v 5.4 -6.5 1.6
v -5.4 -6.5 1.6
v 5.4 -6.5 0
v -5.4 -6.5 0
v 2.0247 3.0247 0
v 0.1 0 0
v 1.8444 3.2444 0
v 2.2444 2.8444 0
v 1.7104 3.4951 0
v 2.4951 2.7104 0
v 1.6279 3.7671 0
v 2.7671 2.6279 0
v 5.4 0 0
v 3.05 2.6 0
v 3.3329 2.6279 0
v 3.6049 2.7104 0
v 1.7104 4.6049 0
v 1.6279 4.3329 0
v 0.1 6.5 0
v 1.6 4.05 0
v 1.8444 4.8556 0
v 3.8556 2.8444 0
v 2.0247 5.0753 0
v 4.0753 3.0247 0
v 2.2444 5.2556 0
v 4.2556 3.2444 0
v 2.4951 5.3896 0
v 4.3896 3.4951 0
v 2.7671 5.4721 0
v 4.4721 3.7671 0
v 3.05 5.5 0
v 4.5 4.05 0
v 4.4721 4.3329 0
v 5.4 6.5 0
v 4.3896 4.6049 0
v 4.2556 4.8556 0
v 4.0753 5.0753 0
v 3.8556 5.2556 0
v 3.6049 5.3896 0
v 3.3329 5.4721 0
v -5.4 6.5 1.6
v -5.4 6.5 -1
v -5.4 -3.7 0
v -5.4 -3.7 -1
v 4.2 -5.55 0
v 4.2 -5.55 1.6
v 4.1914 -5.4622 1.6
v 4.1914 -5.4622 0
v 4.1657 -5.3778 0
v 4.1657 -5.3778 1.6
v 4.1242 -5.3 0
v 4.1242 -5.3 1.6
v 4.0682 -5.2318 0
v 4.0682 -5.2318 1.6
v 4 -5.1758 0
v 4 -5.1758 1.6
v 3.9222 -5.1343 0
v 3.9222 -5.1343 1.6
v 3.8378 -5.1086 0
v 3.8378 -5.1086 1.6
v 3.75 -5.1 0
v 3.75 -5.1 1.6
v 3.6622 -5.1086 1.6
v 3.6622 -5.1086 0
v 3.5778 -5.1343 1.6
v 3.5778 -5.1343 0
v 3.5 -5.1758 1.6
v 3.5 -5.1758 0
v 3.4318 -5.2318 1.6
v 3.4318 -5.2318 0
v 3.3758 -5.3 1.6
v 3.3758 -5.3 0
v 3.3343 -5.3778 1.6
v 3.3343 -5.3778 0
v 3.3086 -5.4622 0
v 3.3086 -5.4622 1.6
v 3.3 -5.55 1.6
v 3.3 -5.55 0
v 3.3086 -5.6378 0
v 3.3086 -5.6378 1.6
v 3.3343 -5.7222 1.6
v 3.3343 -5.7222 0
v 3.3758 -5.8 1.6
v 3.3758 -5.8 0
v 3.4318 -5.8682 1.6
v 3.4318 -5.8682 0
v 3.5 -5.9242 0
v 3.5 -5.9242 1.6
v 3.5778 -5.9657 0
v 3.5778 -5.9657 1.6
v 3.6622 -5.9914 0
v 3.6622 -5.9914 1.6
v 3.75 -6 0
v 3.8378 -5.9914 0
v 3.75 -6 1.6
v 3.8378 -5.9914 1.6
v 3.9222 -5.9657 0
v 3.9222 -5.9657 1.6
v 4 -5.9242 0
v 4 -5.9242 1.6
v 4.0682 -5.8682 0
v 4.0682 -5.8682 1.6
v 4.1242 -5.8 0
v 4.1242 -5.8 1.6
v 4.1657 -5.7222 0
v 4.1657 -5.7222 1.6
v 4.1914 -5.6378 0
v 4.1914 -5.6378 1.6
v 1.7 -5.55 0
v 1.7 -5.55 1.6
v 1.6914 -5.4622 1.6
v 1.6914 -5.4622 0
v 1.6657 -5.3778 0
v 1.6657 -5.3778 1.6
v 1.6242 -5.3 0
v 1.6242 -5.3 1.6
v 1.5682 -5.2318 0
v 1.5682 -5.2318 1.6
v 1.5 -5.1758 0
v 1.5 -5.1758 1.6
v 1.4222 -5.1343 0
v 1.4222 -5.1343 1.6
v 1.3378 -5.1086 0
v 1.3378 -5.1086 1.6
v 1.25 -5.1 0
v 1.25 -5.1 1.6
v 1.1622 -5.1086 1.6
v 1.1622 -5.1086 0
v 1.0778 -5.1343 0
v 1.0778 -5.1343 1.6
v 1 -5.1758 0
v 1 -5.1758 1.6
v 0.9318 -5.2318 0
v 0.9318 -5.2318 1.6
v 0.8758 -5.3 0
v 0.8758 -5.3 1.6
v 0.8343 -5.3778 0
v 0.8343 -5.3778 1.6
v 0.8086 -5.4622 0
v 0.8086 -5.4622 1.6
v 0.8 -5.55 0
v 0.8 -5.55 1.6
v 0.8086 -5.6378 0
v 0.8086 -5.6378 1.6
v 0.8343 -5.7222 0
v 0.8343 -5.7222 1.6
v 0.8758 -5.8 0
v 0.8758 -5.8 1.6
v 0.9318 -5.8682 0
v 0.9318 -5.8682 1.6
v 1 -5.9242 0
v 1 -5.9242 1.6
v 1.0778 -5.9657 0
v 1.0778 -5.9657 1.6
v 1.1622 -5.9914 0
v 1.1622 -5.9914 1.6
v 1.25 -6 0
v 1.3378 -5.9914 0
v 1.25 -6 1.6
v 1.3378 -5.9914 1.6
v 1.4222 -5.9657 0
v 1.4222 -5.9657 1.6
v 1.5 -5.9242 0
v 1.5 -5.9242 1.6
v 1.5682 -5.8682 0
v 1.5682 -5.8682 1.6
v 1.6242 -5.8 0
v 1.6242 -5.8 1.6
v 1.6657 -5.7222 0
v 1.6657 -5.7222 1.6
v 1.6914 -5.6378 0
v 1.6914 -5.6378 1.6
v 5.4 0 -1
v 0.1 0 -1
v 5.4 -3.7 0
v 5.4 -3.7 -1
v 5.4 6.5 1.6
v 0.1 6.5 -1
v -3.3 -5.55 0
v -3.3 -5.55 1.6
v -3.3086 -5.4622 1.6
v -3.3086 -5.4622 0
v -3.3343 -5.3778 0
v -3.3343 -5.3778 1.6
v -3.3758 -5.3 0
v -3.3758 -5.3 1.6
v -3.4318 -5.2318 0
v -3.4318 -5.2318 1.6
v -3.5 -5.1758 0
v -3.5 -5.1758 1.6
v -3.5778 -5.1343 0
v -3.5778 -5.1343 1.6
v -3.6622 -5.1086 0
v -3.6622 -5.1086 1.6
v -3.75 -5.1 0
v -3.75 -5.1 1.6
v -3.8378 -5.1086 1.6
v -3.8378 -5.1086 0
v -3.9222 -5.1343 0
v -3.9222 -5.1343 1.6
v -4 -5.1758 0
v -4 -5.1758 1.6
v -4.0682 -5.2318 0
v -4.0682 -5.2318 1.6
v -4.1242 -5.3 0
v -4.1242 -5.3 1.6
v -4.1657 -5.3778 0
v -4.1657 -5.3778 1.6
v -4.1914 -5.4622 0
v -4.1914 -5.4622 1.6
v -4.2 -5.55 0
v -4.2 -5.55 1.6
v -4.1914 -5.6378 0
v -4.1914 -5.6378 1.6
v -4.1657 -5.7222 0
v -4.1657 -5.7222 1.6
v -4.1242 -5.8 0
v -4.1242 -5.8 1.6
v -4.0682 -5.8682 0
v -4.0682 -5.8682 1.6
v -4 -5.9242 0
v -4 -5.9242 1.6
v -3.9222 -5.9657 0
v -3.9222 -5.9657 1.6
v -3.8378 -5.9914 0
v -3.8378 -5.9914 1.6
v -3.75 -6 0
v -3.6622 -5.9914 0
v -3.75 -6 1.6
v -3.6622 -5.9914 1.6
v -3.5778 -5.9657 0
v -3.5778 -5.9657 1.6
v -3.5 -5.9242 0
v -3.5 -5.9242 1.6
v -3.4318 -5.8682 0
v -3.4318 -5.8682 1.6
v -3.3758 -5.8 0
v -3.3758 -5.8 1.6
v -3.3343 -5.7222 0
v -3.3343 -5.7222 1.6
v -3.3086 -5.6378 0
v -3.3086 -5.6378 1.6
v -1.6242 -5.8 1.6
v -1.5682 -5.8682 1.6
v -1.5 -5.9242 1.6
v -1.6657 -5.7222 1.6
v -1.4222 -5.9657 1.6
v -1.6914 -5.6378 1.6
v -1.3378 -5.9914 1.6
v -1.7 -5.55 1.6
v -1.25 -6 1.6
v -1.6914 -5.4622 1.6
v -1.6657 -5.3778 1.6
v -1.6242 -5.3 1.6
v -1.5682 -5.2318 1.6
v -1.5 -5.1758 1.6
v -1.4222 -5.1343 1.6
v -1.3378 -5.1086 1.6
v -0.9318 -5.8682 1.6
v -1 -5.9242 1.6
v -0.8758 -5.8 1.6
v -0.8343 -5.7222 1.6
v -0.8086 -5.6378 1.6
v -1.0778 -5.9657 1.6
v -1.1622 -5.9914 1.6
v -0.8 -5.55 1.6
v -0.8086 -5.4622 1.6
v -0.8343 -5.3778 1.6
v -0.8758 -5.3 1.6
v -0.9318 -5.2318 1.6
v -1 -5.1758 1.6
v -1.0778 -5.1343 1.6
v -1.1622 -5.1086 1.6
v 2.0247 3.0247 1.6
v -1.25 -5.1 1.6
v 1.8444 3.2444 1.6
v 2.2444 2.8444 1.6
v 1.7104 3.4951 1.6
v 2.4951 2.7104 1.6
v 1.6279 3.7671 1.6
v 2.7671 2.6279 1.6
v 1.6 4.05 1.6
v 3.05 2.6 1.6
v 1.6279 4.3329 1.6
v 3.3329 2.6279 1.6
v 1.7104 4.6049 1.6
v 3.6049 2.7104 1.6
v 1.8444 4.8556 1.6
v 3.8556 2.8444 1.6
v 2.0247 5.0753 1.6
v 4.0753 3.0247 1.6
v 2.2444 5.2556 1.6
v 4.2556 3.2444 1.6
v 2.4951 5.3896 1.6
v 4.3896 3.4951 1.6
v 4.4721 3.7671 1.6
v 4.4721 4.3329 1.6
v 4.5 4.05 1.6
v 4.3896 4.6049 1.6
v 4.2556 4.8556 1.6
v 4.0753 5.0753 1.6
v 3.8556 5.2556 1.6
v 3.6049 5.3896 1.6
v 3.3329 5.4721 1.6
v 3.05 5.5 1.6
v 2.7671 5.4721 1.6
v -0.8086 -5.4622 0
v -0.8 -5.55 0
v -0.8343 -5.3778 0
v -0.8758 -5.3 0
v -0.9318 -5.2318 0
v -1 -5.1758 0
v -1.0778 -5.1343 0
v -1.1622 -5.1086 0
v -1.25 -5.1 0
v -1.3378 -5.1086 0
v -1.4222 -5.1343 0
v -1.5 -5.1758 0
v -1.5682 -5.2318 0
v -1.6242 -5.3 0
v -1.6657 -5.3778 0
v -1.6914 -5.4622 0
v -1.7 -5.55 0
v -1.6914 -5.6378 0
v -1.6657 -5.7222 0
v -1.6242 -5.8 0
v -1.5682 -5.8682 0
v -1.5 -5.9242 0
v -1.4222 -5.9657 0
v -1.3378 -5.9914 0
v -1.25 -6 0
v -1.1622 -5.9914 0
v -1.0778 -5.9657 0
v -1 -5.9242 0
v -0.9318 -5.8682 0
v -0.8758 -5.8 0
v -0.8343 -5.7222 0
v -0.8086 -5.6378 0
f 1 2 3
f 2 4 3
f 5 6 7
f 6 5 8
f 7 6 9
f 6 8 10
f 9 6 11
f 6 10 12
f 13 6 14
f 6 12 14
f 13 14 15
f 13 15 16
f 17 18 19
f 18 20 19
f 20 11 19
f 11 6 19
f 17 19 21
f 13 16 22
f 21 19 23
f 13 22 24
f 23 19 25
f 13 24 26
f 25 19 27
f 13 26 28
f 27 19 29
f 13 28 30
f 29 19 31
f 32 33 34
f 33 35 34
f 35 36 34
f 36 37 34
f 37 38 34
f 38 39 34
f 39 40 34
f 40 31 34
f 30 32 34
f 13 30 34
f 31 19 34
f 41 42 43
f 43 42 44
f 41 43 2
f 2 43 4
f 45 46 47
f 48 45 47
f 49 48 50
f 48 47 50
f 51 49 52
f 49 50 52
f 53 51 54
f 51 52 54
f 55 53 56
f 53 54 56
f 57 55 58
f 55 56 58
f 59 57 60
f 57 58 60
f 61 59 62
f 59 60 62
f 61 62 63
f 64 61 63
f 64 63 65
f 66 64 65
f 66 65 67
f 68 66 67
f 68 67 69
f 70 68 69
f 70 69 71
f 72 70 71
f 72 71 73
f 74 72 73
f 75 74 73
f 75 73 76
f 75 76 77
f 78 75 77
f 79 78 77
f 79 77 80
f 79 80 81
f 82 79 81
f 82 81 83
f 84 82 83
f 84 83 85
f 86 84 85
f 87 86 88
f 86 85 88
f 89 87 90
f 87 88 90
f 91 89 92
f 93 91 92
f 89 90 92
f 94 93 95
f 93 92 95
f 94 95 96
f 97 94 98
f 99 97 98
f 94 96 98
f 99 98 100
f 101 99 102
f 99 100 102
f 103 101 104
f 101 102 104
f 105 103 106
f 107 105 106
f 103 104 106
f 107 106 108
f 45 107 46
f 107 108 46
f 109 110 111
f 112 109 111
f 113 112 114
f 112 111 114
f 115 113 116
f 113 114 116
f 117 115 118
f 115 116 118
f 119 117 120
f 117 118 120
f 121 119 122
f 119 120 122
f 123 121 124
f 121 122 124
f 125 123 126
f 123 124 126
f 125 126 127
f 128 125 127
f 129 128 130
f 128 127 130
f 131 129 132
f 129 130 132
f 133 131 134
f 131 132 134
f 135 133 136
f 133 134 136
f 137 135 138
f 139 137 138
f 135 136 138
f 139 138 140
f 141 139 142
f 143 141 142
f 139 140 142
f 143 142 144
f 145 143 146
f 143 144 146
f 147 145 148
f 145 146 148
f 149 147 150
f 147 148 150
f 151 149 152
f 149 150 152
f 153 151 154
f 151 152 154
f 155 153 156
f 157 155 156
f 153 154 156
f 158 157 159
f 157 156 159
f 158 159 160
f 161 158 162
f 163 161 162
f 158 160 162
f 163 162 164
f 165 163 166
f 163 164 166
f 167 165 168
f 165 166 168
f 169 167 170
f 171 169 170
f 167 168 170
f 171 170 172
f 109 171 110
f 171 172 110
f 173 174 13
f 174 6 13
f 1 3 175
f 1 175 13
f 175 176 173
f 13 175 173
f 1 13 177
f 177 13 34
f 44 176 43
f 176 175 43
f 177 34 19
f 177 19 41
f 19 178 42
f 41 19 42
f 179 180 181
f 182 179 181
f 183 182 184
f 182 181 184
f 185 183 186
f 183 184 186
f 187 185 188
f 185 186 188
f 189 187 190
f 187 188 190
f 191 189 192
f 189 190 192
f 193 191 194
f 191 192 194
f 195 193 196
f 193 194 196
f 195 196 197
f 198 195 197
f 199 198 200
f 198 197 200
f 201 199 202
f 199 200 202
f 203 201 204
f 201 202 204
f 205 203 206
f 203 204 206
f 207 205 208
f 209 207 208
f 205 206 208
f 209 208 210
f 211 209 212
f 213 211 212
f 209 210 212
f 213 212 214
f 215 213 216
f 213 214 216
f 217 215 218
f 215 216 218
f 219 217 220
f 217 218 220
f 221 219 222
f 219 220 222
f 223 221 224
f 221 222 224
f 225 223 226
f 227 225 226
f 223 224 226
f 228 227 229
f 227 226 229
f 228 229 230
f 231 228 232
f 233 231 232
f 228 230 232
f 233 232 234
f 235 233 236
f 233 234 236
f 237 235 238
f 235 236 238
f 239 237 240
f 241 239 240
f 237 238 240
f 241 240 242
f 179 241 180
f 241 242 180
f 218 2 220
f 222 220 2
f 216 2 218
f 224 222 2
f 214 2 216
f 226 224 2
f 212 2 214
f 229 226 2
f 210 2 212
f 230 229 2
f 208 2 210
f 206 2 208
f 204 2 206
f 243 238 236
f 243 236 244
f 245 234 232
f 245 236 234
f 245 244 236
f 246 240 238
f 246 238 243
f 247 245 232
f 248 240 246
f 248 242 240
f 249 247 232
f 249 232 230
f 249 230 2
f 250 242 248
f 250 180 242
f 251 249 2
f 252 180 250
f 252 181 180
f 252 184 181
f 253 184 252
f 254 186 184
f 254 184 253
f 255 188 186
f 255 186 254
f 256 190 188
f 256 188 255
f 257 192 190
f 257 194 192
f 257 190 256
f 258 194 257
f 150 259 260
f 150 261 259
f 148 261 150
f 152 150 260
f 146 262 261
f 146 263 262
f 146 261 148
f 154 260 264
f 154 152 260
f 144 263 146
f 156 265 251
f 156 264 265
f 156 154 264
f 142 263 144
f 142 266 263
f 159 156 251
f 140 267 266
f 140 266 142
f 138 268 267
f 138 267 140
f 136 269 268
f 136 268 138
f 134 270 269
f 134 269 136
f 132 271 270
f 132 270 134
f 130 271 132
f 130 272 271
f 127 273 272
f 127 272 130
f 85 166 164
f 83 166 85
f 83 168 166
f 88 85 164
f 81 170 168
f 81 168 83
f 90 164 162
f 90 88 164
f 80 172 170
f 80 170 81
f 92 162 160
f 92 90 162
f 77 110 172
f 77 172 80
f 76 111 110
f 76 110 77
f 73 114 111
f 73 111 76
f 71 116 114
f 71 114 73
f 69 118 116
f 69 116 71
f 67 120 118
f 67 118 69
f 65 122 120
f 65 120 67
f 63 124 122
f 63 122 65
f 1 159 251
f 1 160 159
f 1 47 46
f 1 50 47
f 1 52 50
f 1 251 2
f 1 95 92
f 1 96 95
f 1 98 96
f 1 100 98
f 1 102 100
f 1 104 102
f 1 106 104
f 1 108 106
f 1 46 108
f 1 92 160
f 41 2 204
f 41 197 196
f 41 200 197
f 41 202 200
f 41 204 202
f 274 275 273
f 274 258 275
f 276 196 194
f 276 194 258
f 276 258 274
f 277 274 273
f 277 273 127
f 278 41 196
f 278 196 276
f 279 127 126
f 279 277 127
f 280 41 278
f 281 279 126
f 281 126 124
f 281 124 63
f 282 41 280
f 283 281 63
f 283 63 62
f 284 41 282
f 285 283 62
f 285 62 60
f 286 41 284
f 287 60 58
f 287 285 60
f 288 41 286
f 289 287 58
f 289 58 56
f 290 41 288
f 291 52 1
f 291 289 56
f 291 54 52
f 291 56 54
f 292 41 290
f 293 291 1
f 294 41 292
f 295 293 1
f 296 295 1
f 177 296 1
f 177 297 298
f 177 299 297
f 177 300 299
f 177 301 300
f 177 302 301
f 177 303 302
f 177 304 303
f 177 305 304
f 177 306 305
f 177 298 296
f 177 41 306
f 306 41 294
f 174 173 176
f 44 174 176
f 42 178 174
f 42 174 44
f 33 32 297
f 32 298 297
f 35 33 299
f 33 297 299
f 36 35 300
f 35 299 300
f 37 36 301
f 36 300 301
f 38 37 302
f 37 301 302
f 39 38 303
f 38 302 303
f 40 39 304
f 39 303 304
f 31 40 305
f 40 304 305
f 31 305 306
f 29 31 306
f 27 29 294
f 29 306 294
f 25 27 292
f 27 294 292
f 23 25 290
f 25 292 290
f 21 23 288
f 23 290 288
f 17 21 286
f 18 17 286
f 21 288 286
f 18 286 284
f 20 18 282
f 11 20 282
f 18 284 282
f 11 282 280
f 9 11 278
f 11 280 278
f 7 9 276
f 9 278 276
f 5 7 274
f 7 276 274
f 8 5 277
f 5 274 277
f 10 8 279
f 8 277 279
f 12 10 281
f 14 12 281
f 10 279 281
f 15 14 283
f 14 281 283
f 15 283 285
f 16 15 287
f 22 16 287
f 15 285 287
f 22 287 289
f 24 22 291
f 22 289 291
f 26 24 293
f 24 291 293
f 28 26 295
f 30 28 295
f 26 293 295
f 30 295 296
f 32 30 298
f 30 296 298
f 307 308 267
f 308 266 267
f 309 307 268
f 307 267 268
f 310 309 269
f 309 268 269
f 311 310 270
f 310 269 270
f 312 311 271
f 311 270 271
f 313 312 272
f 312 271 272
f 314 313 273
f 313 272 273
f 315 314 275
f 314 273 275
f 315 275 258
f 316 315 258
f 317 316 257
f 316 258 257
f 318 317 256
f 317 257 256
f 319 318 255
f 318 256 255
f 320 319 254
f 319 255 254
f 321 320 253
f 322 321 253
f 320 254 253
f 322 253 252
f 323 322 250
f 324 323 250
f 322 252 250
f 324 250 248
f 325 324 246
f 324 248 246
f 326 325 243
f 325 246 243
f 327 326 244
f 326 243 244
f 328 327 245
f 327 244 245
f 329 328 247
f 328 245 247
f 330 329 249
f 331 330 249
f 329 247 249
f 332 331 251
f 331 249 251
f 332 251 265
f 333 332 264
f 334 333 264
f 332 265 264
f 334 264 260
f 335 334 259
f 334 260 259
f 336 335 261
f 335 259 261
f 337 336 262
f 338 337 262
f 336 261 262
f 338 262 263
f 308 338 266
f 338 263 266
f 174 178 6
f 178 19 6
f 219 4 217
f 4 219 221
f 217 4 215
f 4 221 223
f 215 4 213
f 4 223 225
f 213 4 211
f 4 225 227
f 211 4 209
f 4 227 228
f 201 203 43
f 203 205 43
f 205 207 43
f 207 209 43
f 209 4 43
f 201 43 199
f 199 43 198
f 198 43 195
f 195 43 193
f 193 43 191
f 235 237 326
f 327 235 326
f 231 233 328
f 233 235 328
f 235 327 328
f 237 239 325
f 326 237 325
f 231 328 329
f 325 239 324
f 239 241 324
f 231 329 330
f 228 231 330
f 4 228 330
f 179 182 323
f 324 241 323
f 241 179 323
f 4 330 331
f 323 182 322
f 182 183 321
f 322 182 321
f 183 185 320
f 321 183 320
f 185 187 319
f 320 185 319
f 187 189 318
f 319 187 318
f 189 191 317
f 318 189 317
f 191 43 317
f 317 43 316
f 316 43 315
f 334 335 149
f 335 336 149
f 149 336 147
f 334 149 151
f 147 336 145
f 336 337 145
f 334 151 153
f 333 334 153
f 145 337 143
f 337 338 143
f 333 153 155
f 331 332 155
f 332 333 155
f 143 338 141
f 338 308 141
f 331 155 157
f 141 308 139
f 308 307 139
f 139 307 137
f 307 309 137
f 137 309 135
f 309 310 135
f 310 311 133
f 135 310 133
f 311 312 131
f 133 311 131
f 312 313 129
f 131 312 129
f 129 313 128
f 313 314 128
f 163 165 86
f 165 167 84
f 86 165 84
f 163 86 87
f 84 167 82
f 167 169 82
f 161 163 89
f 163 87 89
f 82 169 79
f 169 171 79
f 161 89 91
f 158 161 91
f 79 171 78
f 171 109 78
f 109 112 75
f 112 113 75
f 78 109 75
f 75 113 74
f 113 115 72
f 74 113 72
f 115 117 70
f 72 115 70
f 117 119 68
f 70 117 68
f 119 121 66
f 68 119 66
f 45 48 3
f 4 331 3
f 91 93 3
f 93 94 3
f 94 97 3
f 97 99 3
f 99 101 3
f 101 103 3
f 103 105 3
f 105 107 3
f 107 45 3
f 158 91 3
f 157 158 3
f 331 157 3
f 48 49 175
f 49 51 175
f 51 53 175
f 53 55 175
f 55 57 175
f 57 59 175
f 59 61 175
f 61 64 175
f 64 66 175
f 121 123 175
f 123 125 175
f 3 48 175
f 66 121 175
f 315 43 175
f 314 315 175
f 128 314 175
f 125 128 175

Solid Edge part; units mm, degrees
sketch "Sketch1" plane through (0, 0, 0) normal (0, 0, 1) x (1, 0, 0)
  line L0 (-5.4, -6.5) -> (5.4, -6.5)
  line L1 (5.4, -6.5) -> (5.4, 6.5)
  line L2 (5.4, 6.5) -> (-5.4, 6.5)
  line L3 (-5.4, 6.5) -> (-5.4, -6.5)
  dimension "D1" = 10.8
  dimension "D2" = 13
extrude "Protrusion1" add sketch "Sketch1" along normal blind 1.6
sketch "Sketch2" plane through (0, 0, 1.6) normal (0, 0, 1) x (1, 0, 0)
  circle A0 centre (3.05, 4.05) radius 1.45
  dimension "D1" = 2.9
  dimension "D2" = 1
  dimension "D3" = 0.9
extrude "Cutout1" cut sketch "Sketch2" against normal through all
sketch "Sketch3" plane through (0, 0, 1.6) normal (0, 0, 1) x (1, 0, 0)
  circle A0 centre (-3.75, -5.55) radius 0.45
  circle A1 centre (-1.25, -5.55) radius 0.45
  circle A2 centre (1.25, -5.55) radius 0.45
  circle A3 centre (3.75, -5.55) radius 0.45
  dimension "D1" = 0.9
  dimension "D2" = 2.5
  dimension "D3" = 0.95
extrude "Cutout2" cut sketch "Sketch3" against normal through all
sketch "Sketch4" plane through (0, 0, 0) normal (0, 0, -1) x (-1, 0, 0)
  line L0 (-0.1, 6.5) -> (-0.1, 0)
  line L1 (-0.1, 0) -> (-5.4, 0)
  line L2 (-5.4, 0) -> (-5.4, -3.7)
  line L3 (-5.4, -3.7) -> (5.4, -3.7)
  line L4 (5.4, -3.7) -> (5.4, 6.5)
  line L5 (5.4, 6.5) -> (-0.1, 6.5)
  dimension "D1" = 2.8
  dimension "D2" = 5.5
  dimension "D3" = 6.5
extrude "Extrusionsausprägung_2" add sketch "Sketch4" along normal blind 1
